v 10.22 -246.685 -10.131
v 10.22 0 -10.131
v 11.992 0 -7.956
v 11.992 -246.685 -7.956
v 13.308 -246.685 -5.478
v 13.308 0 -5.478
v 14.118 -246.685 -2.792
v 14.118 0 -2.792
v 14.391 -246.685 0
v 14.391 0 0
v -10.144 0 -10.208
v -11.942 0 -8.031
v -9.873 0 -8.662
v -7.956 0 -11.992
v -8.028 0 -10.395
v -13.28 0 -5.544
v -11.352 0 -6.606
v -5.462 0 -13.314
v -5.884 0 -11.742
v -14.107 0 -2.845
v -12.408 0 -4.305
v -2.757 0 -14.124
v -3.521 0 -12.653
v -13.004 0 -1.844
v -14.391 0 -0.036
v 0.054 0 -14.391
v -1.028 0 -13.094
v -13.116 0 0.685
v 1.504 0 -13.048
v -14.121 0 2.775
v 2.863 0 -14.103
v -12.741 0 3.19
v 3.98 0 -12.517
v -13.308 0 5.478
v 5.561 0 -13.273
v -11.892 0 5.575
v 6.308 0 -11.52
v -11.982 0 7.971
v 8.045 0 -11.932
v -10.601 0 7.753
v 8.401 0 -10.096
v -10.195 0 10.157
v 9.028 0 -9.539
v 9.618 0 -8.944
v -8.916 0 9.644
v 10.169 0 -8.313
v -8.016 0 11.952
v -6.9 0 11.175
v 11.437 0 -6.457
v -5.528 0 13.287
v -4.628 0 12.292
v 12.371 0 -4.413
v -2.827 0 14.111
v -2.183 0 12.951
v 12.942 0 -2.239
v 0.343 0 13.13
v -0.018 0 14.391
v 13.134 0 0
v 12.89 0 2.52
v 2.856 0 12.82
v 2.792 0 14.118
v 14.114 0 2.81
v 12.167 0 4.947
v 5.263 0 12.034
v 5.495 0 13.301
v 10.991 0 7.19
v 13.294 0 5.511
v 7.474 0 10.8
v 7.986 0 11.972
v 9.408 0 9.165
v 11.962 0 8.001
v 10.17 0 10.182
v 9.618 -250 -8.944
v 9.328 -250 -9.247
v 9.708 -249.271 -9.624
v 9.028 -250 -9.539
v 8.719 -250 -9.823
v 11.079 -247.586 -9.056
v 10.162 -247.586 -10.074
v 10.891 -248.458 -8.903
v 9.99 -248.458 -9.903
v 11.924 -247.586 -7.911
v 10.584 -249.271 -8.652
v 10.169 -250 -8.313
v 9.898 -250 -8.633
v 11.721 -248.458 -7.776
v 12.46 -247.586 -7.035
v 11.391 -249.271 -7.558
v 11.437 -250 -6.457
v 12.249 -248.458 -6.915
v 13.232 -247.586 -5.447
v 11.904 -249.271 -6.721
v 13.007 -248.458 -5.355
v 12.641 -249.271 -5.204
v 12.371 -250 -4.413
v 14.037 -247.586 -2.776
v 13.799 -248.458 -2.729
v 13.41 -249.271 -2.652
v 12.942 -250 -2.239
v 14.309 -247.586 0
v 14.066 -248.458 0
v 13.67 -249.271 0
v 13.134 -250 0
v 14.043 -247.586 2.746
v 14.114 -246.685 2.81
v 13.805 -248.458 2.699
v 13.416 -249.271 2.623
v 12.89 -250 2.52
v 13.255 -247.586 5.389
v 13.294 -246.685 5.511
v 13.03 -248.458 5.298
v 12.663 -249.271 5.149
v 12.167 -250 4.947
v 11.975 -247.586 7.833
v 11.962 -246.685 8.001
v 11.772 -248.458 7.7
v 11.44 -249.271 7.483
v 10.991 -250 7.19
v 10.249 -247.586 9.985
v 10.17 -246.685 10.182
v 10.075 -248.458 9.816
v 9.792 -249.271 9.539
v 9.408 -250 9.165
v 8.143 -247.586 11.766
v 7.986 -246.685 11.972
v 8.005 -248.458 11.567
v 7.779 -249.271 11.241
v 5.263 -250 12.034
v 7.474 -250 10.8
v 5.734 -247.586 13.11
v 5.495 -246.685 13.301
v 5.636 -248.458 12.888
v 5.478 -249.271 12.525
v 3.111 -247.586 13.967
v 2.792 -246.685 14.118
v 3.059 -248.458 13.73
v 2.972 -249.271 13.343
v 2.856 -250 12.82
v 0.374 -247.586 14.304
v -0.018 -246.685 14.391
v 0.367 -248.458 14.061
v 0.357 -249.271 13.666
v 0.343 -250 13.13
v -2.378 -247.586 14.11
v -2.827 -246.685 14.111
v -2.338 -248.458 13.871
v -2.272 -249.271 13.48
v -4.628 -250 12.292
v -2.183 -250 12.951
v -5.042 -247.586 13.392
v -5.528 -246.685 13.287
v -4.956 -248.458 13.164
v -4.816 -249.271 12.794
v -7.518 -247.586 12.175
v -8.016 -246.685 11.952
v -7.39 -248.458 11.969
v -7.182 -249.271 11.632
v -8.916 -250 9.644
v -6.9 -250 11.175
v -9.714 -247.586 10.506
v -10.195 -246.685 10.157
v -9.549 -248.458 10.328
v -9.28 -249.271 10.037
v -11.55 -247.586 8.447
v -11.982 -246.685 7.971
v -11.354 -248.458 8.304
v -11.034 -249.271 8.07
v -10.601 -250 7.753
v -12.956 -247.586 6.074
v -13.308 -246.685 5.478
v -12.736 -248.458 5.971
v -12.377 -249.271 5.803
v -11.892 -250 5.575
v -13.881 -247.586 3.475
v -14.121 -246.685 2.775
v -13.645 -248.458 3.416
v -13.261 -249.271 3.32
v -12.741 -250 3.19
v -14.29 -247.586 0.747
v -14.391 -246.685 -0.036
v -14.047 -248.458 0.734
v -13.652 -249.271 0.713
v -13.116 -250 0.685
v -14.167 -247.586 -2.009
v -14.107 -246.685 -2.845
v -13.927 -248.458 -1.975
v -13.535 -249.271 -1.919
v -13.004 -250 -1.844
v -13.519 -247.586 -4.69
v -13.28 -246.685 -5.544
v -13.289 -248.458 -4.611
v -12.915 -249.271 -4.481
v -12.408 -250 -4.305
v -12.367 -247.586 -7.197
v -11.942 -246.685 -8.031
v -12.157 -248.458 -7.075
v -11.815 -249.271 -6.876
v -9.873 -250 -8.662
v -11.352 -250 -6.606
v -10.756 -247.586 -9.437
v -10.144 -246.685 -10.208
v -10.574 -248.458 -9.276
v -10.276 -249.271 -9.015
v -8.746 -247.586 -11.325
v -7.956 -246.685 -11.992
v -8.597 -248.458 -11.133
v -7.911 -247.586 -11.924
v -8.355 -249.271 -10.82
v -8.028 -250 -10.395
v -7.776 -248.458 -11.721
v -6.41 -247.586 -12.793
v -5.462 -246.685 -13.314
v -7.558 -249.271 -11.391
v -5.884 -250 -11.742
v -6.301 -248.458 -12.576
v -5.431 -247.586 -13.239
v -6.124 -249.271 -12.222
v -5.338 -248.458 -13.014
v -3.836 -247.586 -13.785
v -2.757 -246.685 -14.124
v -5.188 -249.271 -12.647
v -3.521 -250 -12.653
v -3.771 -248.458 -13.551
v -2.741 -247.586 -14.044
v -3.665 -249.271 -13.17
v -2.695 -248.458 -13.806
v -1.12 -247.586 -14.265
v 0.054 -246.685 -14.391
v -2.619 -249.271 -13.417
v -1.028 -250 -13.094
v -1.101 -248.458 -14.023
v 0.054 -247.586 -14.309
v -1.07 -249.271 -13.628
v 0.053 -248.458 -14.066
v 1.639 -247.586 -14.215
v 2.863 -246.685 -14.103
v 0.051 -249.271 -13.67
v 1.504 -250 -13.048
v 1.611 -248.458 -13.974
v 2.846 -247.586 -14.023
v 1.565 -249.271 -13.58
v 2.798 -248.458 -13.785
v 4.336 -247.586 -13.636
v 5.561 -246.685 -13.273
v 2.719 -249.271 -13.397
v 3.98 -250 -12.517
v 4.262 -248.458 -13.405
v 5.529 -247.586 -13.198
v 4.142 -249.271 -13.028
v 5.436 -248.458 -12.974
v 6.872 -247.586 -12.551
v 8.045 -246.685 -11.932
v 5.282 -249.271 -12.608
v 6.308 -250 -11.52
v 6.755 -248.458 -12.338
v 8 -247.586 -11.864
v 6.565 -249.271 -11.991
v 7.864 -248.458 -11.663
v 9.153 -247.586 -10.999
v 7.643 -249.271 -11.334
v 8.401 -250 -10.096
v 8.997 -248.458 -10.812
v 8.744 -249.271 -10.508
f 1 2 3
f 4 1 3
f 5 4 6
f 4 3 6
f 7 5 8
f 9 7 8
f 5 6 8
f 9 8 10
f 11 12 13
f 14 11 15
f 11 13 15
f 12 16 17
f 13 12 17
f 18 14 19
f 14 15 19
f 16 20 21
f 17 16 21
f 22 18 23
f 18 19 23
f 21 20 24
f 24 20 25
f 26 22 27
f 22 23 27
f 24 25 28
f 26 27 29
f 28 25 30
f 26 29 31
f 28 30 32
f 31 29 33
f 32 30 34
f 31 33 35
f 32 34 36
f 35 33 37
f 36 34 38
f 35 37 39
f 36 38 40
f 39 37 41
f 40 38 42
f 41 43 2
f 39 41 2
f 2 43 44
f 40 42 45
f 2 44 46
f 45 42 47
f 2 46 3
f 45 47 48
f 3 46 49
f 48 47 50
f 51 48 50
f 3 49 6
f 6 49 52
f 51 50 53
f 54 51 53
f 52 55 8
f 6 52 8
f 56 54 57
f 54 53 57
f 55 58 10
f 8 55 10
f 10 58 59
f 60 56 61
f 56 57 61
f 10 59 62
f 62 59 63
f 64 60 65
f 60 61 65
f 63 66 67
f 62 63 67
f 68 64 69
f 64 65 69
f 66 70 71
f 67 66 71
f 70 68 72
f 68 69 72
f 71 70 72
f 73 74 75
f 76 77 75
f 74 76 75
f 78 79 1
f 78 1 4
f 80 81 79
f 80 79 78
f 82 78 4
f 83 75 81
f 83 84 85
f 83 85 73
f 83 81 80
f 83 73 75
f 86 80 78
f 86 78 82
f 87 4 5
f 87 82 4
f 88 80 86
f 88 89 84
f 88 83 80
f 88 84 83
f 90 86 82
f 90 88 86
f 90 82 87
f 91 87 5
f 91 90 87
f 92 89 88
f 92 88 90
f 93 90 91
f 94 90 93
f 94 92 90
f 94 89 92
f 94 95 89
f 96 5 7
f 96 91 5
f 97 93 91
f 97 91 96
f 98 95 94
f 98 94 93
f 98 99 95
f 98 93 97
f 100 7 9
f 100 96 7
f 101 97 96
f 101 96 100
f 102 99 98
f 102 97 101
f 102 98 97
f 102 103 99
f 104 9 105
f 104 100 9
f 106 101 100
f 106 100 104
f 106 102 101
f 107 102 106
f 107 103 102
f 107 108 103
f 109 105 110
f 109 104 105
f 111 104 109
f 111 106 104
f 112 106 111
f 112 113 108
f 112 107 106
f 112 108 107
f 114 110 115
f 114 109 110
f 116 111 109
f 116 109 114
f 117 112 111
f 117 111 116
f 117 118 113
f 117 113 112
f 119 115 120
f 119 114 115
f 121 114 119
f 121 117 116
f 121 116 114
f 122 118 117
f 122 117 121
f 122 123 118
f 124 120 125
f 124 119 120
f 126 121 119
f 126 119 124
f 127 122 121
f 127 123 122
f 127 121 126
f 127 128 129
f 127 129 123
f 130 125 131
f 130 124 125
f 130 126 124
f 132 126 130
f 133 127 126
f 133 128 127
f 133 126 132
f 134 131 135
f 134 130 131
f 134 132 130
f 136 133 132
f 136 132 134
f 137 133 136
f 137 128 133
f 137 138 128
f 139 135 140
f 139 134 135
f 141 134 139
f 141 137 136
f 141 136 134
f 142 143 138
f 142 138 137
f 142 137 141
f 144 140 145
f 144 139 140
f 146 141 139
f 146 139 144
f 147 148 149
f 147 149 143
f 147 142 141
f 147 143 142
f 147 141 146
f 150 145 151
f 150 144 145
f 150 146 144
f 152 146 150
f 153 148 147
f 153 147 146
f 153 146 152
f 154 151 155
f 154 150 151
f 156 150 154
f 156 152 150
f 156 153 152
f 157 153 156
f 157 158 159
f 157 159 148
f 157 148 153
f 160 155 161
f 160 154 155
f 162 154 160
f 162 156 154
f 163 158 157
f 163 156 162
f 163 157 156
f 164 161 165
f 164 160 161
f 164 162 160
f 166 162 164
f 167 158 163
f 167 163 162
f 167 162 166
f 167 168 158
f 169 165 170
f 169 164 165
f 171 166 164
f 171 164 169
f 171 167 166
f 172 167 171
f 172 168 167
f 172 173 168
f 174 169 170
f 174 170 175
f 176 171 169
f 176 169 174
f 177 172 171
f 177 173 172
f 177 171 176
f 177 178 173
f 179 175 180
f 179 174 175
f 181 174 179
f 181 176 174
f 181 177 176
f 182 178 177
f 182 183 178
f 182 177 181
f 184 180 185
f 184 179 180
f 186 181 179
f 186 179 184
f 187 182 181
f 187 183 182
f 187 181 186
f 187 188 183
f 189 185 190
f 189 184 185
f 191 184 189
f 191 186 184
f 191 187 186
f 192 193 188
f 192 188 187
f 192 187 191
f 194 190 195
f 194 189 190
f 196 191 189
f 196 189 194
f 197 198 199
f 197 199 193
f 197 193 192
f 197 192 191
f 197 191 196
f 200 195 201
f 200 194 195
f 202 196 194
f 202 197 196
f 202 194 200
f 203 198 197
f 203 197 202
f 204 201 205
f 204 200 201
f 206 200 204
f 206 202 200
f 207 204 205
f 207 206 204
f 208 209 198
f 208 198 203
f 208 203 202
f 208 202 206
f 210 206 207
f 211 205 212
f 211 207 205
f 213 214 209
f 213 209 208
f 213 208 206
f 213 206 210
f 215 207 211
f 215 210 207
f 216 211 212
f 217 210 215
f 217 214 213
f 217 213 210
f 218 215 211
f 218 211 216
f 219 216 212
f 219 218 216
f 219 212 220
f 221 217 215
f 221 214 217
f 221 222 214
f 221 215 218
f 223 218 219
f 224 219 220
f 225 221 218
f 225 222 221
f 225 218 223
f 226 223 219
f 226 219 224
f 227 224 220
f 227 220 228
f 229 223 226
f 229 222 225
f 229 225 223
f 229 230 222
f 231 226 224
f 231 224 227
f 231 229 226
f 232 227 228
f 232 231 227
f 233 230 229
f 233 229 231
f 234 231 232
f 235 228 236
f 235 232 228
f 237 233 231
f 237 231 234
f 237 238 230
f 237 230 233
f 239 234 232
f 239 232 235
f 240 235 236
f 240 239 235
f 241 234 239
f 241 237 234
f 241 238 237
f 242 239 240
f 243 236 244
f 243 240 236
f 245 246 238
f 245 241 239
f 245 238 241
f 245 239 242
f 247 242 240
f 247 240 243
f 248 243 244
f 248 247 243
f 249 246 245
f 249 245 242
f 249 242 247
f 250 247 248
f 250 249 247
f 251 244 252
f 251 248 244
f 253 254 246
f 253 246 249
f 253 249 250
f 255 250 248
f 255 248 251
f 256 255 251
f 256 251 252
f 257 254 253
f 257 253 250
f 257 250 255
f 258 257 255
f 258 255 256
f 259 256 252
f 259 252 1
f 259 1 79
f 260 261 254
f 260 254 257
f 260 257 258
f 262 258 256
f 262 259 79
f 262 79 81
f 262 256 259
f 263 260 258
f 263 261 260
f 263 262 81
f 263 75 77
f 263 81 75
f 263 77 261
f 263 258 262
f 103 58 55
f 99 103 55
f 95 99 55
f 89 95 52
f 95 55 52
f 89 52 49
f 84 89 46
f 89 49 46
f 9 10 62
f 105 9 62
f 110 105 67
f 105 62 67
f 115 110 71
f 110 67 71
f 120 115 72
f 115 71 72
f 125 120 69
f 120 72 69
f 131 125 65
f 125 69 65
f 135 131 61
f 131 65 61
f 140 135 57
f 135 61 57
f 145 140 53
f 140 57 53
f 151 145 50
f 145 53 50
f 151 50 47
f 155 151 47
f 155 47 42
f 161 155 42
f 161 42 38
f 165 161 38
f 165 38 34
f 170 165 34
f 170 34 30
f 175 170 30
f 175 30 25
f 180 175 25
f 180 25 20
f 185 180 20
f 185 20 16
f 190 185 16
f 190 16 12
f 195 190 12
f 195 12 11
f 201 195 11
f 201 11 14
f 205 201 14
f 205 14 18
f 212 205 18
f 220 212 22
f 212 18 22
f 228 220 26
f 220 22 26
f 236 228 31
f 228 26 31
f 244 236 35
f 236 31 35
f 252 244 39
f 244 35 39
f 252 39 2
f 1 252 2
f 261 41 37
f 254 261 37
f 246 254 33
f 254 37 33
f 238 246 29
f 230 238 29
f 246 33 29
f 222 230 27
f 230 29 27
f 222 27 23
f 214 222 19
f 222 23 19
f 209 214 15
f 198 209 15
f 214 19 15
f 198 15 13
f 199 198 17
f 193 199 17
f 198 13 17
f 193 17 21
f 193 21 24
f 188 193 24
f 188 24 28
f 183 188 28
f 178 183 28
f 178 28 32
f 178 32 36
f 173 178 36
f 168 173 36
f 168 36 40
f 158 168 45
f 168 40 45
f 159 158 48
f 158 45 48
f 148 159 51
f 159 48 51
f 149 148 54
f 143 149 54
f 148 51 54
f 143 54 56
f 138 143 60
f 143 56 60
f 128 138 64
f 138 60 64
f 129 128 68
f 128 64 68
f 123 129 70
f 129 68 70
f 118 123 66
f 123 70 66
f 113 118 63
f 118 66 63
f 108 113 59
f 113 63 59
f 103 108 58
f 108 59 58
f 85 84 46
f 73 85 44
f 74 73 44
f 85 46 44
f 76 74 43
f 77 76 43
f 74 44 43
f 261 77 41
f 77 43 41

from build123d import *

# Parameters (mm, degrees)
F1_DEPTH = 250


# Not quite as in the source:
# - a fillet or chamfer that OpenCascade refuses, or shapes differently, is made with other operations: its cross-section is extruded or revolved along the edge and cut away or added


with BuildPart() as f1:
    # F0 (on Front) → F1 (new body)
    with BuildSketch(Plane.XZ):
        with BuildLine():
            ThreePointArc((14.3910080635, 0), (-13.3075418668, 5.4781787619), (10.2202866776, -10.1314783379))
            ThreePointArc((10.2202866776, -10.1314783379), (13.3075418668, -5.4781787619), (14.3910080635, 0))
        make_face()
        with BuildLine():
            ThreePointArc((8.400959745, -10.0958666852), (-11.8920367391, 5.5751332681), (13.1340263728, 0))
            ThreePointArc((13.1340263728, 0), (12.3705279138, -4.4127868626), (10.168798903, -8.3125313612))
            ThreePointArc((10.168798903, -8.3125313612), (10.4759385173, -8.7353566894), (10.5845781271, -9.2465449483))
            ThreePointArc((10.5845781271, -9.2465449483), (10.4899428261, -9.7250361614), (10.2202866776, -10.1314783379))
            ThreePointArc((10.2202866776, -10.1314783379), (9.3029968872, -10.5032859052), (8.400959745, -10.0958666852))
        make_face(mode=Mode.SUBTRACT)
        with BuildLine():
            ThreePointArc((10.168798903, -8.3125313612), (9.3275964364, -9.2465449483), (8.400959745, -10.0958666852))
            ThreePointArc((8.400959745, -10.0958666852), (9.3029968872, -10.5032859052), (10.2202866776, -10.1314783379))
            ThreePointArc((10.2202866776, -10.1314783379), (10.4899428261, -9.7250361614), (10.5845781271, -9.2465449483))
            ThreePointArc((10.5845781271, -9.2465449483), (10.4759385173, -8.7353566894), (10.168798903, -8.3125313612))
        make_face()
    extrude(amount=F1_DEPTH)

    # F2: fillet of radius 5 on 1 edges, made by hand

    # F2_s1 → F2_t2 (revolve, cut)
    with BuildSketch(Plane(origin=(0, 0, 0), x_dir=(0, 1, 0), z_dir=(-0.7040144994, 0, -0.7101855987))):
        with BuildLine():
            ThreePointArc((-246.6849111722, 14.3910080635), (-248.4576080518, 14.0662134893), (-250, 13.1340263728))
            Line((-250, 13.1340263728), (-250, 14.3910080635))
            Line((-250, 14.3910080635), (-246.6849111722, 14.3910080635))
        make_face()
    revolve(axis=Axis((0, -250, 0), (0, -1, 0)), mode=Mode.SUBTRACT)


solid = f1.part
